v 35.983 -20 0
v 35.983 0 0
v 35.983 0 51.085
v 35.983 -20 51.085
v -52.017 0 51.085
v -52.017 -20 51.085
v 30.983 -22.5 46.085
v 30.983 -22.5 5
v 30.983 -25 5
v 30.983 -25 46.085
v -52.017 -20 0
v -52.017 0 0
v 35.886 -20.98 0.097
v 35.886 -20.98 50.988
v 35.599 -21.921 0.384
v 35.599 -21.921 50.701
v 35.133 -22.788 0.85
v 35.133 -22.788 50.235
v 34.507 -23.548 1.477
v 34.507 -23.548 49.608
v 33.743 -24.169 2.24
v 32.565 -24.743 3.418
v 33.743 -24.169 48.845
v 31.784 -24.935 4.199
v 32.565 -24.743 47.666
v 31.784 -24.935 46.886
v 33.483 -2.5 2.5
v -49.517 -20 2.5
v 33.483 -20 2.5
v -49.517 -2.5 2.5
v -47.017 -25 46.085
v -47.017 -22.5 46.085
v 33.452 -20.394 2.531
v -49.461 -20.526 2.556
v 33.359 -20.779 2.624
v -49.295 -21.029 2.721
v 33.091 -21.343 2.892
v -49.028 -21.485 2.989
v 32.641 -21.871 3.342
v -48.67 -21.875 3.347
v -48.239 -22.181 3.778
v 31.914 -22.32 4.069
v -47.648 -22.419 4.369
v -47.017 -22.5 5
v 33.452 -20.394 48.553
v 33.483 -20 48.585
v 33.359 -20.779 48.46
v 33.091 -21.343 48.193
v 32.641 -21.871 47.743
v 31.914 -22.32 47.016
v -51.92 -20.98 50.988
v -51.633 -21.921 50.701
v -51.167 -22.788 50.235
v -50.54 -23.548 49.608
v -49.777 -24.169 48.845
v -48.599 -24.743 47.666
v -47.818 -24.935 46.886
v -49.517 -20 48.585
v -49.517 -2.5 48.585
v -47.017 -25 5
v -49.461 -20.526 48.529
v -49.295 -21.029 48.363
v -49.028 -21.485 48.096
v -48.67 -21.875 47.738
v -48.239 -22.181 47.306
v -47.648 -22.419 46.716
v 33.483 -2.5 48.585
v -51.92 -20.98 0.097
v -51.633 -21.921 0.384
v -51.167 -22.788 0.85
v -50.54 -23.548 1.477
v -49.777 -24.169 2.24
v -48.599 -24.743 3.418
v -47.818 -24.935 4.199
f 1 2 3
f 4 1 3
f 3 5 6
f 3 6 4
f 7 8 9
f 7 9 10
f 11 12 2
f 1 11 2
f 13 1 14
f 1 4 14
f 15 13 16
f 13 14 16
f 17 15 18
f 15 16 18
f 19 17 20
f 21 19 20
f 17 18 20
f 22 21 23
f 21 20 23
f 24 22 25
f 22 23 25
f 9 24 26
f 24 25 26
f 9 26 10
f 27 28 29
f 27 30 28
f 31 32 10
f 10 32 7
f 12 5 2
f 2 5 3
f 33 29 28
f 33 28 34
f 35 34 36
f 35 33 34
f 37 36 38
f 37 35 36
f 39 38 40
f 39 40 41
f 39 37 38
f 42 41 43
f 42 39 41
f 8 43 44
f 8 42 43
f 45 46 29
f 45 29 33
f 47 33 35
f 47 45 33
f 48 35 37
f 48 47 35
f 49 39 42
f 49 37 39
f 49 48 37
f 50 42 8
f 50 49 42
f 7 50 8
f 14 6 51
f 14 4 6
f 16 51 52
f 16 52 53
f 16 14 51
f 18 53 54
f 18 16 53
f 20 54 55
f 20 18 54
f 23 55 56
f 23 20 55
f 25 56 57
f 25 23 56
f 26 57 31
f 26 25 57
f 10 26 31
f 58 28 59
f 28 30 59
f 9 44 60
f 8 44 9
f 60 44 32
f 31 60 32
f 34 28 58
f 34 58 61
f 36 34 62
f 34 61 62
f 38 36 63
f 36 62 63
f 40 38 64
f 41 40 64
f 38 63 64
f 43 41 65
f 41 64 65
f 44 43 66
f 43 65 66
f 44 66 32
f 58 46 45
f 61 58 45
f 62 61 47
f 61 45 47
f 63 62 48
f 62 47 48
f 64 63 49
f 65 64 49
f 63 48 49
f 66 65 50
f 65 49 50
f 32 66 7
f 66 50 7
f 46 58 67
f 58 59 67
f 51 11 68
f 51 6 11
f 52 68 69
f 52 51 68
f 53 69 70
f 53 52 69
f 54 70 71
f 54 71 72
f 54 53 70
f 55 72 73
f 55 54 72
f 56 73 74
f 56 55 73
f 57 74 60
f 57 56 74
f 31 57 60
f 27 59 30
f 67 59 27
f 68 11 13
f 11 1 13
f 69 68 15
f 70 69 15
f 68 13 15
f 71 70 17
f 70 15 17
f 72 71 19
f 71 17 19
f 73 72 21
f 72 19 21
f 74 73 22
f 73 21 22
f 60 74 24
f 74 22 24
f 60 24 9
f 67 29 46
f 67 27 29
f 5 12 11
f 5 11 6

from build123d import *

# Parameters (mm, degrees)
F0_W     = 88
F0_H     = 51.0847450688
F1_DEPTH = 25
F2_R     = 5
F3_T     = -2.5


# Not quite as in the source:
# - a shell that OpenCascade refuses in one call is made with other operations: the cavity is built on its own and cut out


with BuildPart() as f1:
    # F0 (on Front) → F1 (new body)
    with BuildSketch(Plane.XZ):
        with Locations((-8.0169501303, 25.5423725344)):
            Rectangle(F0_W, F0_H)
    extrude(amount=F1_DEPTH)

    # F2
    f2_edges = [f1.edges().sort_by_distance(p)[0] for p in [
        (-52.01695, -25, 25.542373),
        (-8.01695, -25, 0),
        (35.98305, -25, 25.542373),
        (-8.01695, -25, 51.084745),
    ]]
    fillet(f2_edges, radius=F2_R)

    # F3: a shell. OpenCascade refuses it in one call, so the cavity is built on its own and cut out:
    # the body offset inwards by the wall thickness, plus a prism from it out through each open face.
    f3_core = offset(f1.part, amount=F3_T, mode=Mode.PRIVATE)
    f3_exits = [f3_core.faces().sort_by_distance(p)[0] for p in [
        (-8.01695, -22.5, 25.542373),
    ]]
    add(f3_core, mode=Mode.SUBTRACT)
    extrude(f3_exits, amount=-F3_T, mode=Mode.SUBTRACT)


solid = f1.part
